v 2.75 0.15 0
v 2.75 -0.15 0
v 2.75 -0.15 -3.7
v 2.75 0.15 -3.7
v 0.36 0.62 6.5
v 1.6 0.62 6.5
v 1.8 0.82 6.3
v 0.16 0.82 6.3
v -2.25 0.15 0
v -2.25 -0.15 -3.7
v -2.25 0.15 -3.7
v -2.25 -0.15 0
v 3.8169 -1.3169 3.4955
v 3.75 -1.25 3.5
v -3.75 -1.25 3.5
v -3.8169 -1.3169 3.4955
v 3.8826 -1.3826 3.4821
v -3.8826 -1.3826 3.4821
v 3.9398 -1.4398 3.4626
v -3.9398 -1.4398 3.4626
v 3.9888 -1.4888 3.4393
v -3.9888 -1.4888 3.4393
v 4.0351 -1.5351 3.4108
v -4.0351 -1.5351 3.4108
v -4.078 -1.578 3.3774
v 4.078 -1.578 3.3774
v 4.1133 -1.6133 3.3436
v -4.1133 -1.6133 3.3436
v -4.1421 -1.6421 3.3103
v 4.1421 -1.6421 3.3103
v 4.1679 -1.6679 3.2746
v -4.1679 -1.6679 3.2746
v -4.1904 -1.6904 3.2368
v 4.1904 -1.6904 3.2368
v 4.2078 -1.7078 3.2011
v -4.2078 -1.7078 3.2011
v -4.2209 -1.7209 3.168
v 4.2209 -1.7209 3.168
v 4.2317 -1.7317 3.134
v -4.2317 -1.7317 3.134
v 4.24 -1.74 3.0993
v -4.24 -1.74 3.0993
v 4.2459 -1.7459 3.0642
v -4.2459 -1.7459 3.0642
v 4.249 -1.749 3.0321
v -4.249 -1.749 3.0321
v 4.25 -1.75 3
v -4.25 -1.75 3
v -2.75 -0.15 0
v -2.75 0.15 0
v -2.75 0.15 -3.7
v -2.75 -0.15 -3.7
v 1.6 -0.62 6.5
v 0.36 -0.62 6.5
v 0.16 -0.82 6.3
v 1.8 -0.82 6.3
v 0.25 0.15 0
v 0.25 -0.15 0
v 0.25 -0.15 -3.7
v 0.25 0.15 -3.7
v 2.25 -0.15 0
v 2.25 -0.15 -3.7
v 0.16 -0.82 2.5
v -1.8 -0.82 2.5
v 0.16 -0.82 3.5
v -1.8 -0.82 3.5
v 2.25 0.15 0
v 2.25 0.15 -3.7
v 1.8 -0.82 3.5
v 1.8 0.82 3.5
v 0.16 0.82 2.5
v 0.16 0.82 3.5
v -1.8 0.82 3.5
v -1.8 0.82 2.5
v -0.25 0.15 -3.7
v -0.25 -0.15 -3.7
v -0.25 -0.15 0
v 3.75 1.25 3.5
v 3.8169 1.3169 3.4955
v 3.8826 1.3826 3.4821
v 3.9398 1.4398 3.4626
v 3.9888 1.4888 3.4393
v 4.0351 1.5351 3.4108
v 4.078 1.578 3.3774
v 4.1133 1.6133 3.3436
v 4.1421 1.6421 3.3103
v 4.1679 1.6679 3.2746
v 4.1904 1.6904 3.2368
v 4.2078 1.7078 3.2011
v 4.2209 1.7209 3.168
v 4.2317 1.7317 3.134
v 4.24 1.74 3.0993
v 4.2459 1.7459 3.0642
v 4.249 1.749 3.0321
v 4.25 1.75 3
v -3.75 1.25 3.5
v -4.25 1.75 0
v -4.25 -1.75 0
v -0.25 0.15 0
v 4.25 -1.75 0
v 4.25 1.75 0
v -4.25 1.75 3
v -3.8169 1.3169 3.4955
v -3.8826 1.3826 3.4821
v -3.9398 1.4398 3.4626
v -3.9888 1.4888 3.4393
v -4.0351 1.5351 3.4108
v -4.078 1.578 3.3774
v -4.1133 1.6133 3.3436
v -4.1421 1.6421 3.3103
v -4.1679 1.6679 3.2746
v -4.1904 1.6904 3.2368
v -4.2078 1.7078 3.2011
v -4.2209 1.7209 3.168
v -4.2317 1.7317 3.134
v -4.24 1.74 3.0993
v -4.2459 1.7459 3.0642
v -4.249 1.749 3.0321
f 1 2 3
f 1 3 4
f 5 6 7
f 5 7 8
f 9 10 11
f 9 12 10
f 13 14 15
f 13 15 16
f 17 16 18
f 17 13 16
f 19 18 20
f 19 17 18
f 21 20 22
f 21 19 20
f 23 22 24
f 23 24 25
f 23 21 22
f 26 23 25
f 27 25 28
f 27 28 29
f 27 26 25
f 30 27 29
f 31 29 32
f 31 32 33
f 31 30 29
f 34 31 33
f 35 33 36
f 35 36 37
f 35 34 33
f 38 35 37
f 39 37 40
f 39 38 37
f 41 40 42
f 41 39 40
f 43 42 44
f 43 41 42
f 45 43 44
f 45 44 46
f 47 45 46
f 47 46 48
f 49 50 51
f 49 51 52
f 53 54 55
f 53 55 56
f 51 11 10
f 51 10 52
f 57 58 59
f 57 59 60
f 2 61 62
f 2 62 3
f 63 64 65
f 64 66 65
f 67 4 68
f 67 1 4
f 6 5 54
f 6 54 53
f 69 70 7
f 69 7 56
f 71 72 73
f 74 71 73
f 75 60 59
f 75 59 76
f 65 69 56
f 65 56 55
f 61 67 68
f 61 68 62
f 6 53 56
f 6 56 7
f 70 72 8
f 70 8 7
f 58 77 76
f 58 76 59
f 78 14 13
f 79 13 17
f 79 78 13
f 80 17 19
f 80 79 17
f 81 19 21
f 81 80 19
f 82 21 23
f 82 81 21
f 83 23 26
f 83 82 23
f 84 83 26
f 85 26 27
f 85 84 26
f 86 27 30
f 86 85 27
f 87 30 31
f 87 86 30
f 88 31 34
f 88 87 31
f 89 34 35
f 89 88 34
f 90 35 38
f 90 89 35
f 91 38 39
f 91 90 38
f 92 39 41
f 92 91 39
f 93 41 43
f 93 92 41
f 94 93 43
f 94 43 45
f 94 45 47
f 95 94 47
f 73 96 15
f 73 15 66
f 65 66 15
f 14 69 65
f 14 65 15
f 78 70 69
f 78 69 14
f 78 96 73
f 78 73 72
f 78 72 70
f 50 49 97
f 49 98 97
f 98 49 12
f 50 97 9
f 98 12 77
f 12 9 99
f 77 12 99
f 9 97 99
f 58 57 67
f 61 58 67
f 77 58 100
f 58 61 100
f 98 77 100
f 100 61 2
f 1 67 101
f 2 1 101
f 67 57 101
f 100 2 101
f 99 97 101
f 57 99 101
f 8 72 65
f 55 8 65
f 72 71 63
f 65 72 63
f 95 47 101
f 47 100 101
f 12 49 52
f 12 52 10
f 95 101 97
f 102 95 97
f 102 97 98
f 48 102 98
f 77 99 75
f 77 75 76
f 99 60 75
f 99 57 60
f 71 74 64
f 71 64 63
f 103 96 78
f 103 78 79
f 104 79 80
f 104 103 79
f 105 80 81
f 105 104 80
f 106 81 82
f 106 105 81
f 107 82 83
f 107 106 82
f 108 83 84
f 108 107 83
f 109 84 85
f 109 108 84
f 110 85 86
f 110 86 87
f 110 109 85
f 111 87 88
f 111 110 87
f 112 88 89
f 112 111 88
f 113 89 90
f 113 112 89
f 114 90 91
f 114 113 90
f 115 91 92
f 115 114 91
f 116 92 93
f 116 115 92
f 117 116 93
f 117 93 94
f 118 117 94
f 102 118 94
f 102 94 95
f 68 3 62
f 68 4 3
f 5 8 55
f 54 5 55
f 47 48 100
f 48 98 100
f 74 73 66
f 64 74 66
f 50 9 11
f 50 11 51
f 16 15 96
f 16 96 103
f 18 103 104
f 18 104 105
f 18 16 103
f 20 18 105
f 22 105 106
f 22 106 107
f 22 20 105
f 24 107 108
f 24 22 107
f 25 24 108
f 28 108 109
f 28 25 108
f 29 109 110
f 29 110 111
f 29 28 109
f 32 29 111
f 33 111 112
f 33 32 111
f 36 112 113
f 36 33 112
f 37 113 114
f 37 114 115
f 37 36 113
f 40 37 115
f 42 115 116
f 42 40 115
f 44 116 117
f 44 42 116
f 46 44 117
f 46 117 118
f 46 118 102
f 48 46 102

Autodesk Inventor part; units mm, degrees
ref_plane "YZ Plane" through (0, 0, 0) normal (1, 0, 0) x (0, 1, 0)
ref_plane "XZ Plane" through (0, 0, 0) normal (0, 1, 0) x (-1, 0, 0)
ref_plane "XY Plane" through (0, 0, 0) normal (0, 0, 1) x (1, 0, 0)
sketch "Sketch1" plane through (0, 0, 0) normal (0, 0, 1) x (1, 0, 0)
  line L0 (4.25, 1.75) -> (-4.25, 1.75)
  line L1 (-4.25, 1.75) -> (-4.25, -1.75)
  line L2 (-4.25, -1.75) -> (4.25, -1.75)
  line L3 (4.25, -1.75) -> (4.25, 1.75)
  line L4 (4.25, 1.75) -> (-4.25, -1.75) construction
  line L5 (-4.25, 1.75) -> (4.25, -1.75) construction
  point P0 (0, 0)
  dimension "d0" = 8.5
  dimension "d1" = 3.5
extrude "Extrusion1" add sketch "Sketch1" along normal blind 3.5
sketch "Sketch2" plane through (0, 0, 3.5) normal (0, 0, 1) x (1, 0, 0)
  line L0 (1.8, 0.82) -> (-1.8, 0.82)
  line L1 (-1.8, 0.82) -> (-1.8, -0.82)
  line L2 (-1.8, -0.82) -> (1.8, -0.82)
  line L3 (1.8, -0.82) -> (1.8, 0.82)
  line L4 (1.8, 0.82) -> (-1.8, -0.82) construction
  line L5 (-1.8, 0.82) -> (1.8, -0.82) construction
  point P0 (0, 0)
  dimension "d4" = 3.6
  dimension "d5" = 1.64
extrude "Extrusion2" cut sketch "Sketch2" against normal blind 1
sketch "Sketch3" plane through (0, 0, 2.5) normal (0, 0, 1) x (1, 0, 0)
  line L0 (-1.8, -0.82) -> (-1.8, 0.82) projected
  line L1 (1.8, -0.82) -> (-1.8, -0.82) projected
  line L2 (1.8, 0.82) -> (1.8, -0.82) projected
  line L3 (-1.8, 0.82) -> (1.8, 0.82) projected
  line L4 (1.8, 0.82) -> (0.16, 0.82)
  line L5 (0.16, 0.82) -> (0.16, -0.82)
  line L6 (0.16, -0.82) -> (1.8, -0.82)
  line L7 (1.8, -0.82) -> (1.8, 0.82)
  point P0 (0, 0)
  dimension "d8" = 1.64
extrude "Extrusion3" add sketch "Sketch3" along normal blind 4 contours L5 L3 L2 L1
fillet "Fillet1" radius 0.5 4 edges at (0, 1.75, 3.5) (-4.25, 0, 3.5) (0, -1.75, 3.5) (4.25, 0, 3.5)
chamfer "Chamfer1" distance 0.2 angle 45 4 edges at (0.98, 0.82, 6.5) (0.16, 0, 6.5) (0.98, -0.82, 6.5) (1.8, 0, 6.5)
sketch "Sketch4" plane through (0, 0, 0) normal (0, 0, -1) x (-1, 0, 0)
  line L0 (-2.75, 0.15) -> (-2.25, 0.15)
  line L1 (-2.25, 0.15) -> (-2.25, -0.15)
  line L2 (-2.25, -0.15) -> (-2.75, -0.15)
  line L3 (-2.75, -0.15) -> (-2.75, 0.15)
  line L4 (-0.25, 0.15) -> (0.25, 0.15)
  line L5 (0.25, 0.15) -> (0.25, -0.15)
  line L6 (0.25, -0.15) -> (-0.25, -0.15)
  line L7 (-0.25, -0.15) -> (-0.25, 0.15)
  line L8 (2.25, 0.15) -> (2.75, 0.15)
  line L9 (2.75, 0.15) -> (2.75, -0.15)
  line L10 (2.75, -0.15) -> (2.25, -0.15)
  line L11 (2.25, -0.15) -> (2.25, 0.15)
  point P0 (0, 0)
  point P1 (0, 0.15)
  point P2 (-2.5, 0.15)
  point P3 (2.5, 0.15)
  dimension "d15" = 0.5
  dimension "d16" = 0.3
  dimension "d17" = 0.5
  dimension "d18" = 0.3
  dimension "d19" = 0.5
  dimension "d20" = 0.3
  dimension "d21" = 2.5
  dimension "d22" = 2.5
  dimension "d24" = 0.15
  dimension "d25" = 0.25
extrude "Extrusion4" add sketch "Sketch4" along normal blind 3.7
properties part number "switch"
